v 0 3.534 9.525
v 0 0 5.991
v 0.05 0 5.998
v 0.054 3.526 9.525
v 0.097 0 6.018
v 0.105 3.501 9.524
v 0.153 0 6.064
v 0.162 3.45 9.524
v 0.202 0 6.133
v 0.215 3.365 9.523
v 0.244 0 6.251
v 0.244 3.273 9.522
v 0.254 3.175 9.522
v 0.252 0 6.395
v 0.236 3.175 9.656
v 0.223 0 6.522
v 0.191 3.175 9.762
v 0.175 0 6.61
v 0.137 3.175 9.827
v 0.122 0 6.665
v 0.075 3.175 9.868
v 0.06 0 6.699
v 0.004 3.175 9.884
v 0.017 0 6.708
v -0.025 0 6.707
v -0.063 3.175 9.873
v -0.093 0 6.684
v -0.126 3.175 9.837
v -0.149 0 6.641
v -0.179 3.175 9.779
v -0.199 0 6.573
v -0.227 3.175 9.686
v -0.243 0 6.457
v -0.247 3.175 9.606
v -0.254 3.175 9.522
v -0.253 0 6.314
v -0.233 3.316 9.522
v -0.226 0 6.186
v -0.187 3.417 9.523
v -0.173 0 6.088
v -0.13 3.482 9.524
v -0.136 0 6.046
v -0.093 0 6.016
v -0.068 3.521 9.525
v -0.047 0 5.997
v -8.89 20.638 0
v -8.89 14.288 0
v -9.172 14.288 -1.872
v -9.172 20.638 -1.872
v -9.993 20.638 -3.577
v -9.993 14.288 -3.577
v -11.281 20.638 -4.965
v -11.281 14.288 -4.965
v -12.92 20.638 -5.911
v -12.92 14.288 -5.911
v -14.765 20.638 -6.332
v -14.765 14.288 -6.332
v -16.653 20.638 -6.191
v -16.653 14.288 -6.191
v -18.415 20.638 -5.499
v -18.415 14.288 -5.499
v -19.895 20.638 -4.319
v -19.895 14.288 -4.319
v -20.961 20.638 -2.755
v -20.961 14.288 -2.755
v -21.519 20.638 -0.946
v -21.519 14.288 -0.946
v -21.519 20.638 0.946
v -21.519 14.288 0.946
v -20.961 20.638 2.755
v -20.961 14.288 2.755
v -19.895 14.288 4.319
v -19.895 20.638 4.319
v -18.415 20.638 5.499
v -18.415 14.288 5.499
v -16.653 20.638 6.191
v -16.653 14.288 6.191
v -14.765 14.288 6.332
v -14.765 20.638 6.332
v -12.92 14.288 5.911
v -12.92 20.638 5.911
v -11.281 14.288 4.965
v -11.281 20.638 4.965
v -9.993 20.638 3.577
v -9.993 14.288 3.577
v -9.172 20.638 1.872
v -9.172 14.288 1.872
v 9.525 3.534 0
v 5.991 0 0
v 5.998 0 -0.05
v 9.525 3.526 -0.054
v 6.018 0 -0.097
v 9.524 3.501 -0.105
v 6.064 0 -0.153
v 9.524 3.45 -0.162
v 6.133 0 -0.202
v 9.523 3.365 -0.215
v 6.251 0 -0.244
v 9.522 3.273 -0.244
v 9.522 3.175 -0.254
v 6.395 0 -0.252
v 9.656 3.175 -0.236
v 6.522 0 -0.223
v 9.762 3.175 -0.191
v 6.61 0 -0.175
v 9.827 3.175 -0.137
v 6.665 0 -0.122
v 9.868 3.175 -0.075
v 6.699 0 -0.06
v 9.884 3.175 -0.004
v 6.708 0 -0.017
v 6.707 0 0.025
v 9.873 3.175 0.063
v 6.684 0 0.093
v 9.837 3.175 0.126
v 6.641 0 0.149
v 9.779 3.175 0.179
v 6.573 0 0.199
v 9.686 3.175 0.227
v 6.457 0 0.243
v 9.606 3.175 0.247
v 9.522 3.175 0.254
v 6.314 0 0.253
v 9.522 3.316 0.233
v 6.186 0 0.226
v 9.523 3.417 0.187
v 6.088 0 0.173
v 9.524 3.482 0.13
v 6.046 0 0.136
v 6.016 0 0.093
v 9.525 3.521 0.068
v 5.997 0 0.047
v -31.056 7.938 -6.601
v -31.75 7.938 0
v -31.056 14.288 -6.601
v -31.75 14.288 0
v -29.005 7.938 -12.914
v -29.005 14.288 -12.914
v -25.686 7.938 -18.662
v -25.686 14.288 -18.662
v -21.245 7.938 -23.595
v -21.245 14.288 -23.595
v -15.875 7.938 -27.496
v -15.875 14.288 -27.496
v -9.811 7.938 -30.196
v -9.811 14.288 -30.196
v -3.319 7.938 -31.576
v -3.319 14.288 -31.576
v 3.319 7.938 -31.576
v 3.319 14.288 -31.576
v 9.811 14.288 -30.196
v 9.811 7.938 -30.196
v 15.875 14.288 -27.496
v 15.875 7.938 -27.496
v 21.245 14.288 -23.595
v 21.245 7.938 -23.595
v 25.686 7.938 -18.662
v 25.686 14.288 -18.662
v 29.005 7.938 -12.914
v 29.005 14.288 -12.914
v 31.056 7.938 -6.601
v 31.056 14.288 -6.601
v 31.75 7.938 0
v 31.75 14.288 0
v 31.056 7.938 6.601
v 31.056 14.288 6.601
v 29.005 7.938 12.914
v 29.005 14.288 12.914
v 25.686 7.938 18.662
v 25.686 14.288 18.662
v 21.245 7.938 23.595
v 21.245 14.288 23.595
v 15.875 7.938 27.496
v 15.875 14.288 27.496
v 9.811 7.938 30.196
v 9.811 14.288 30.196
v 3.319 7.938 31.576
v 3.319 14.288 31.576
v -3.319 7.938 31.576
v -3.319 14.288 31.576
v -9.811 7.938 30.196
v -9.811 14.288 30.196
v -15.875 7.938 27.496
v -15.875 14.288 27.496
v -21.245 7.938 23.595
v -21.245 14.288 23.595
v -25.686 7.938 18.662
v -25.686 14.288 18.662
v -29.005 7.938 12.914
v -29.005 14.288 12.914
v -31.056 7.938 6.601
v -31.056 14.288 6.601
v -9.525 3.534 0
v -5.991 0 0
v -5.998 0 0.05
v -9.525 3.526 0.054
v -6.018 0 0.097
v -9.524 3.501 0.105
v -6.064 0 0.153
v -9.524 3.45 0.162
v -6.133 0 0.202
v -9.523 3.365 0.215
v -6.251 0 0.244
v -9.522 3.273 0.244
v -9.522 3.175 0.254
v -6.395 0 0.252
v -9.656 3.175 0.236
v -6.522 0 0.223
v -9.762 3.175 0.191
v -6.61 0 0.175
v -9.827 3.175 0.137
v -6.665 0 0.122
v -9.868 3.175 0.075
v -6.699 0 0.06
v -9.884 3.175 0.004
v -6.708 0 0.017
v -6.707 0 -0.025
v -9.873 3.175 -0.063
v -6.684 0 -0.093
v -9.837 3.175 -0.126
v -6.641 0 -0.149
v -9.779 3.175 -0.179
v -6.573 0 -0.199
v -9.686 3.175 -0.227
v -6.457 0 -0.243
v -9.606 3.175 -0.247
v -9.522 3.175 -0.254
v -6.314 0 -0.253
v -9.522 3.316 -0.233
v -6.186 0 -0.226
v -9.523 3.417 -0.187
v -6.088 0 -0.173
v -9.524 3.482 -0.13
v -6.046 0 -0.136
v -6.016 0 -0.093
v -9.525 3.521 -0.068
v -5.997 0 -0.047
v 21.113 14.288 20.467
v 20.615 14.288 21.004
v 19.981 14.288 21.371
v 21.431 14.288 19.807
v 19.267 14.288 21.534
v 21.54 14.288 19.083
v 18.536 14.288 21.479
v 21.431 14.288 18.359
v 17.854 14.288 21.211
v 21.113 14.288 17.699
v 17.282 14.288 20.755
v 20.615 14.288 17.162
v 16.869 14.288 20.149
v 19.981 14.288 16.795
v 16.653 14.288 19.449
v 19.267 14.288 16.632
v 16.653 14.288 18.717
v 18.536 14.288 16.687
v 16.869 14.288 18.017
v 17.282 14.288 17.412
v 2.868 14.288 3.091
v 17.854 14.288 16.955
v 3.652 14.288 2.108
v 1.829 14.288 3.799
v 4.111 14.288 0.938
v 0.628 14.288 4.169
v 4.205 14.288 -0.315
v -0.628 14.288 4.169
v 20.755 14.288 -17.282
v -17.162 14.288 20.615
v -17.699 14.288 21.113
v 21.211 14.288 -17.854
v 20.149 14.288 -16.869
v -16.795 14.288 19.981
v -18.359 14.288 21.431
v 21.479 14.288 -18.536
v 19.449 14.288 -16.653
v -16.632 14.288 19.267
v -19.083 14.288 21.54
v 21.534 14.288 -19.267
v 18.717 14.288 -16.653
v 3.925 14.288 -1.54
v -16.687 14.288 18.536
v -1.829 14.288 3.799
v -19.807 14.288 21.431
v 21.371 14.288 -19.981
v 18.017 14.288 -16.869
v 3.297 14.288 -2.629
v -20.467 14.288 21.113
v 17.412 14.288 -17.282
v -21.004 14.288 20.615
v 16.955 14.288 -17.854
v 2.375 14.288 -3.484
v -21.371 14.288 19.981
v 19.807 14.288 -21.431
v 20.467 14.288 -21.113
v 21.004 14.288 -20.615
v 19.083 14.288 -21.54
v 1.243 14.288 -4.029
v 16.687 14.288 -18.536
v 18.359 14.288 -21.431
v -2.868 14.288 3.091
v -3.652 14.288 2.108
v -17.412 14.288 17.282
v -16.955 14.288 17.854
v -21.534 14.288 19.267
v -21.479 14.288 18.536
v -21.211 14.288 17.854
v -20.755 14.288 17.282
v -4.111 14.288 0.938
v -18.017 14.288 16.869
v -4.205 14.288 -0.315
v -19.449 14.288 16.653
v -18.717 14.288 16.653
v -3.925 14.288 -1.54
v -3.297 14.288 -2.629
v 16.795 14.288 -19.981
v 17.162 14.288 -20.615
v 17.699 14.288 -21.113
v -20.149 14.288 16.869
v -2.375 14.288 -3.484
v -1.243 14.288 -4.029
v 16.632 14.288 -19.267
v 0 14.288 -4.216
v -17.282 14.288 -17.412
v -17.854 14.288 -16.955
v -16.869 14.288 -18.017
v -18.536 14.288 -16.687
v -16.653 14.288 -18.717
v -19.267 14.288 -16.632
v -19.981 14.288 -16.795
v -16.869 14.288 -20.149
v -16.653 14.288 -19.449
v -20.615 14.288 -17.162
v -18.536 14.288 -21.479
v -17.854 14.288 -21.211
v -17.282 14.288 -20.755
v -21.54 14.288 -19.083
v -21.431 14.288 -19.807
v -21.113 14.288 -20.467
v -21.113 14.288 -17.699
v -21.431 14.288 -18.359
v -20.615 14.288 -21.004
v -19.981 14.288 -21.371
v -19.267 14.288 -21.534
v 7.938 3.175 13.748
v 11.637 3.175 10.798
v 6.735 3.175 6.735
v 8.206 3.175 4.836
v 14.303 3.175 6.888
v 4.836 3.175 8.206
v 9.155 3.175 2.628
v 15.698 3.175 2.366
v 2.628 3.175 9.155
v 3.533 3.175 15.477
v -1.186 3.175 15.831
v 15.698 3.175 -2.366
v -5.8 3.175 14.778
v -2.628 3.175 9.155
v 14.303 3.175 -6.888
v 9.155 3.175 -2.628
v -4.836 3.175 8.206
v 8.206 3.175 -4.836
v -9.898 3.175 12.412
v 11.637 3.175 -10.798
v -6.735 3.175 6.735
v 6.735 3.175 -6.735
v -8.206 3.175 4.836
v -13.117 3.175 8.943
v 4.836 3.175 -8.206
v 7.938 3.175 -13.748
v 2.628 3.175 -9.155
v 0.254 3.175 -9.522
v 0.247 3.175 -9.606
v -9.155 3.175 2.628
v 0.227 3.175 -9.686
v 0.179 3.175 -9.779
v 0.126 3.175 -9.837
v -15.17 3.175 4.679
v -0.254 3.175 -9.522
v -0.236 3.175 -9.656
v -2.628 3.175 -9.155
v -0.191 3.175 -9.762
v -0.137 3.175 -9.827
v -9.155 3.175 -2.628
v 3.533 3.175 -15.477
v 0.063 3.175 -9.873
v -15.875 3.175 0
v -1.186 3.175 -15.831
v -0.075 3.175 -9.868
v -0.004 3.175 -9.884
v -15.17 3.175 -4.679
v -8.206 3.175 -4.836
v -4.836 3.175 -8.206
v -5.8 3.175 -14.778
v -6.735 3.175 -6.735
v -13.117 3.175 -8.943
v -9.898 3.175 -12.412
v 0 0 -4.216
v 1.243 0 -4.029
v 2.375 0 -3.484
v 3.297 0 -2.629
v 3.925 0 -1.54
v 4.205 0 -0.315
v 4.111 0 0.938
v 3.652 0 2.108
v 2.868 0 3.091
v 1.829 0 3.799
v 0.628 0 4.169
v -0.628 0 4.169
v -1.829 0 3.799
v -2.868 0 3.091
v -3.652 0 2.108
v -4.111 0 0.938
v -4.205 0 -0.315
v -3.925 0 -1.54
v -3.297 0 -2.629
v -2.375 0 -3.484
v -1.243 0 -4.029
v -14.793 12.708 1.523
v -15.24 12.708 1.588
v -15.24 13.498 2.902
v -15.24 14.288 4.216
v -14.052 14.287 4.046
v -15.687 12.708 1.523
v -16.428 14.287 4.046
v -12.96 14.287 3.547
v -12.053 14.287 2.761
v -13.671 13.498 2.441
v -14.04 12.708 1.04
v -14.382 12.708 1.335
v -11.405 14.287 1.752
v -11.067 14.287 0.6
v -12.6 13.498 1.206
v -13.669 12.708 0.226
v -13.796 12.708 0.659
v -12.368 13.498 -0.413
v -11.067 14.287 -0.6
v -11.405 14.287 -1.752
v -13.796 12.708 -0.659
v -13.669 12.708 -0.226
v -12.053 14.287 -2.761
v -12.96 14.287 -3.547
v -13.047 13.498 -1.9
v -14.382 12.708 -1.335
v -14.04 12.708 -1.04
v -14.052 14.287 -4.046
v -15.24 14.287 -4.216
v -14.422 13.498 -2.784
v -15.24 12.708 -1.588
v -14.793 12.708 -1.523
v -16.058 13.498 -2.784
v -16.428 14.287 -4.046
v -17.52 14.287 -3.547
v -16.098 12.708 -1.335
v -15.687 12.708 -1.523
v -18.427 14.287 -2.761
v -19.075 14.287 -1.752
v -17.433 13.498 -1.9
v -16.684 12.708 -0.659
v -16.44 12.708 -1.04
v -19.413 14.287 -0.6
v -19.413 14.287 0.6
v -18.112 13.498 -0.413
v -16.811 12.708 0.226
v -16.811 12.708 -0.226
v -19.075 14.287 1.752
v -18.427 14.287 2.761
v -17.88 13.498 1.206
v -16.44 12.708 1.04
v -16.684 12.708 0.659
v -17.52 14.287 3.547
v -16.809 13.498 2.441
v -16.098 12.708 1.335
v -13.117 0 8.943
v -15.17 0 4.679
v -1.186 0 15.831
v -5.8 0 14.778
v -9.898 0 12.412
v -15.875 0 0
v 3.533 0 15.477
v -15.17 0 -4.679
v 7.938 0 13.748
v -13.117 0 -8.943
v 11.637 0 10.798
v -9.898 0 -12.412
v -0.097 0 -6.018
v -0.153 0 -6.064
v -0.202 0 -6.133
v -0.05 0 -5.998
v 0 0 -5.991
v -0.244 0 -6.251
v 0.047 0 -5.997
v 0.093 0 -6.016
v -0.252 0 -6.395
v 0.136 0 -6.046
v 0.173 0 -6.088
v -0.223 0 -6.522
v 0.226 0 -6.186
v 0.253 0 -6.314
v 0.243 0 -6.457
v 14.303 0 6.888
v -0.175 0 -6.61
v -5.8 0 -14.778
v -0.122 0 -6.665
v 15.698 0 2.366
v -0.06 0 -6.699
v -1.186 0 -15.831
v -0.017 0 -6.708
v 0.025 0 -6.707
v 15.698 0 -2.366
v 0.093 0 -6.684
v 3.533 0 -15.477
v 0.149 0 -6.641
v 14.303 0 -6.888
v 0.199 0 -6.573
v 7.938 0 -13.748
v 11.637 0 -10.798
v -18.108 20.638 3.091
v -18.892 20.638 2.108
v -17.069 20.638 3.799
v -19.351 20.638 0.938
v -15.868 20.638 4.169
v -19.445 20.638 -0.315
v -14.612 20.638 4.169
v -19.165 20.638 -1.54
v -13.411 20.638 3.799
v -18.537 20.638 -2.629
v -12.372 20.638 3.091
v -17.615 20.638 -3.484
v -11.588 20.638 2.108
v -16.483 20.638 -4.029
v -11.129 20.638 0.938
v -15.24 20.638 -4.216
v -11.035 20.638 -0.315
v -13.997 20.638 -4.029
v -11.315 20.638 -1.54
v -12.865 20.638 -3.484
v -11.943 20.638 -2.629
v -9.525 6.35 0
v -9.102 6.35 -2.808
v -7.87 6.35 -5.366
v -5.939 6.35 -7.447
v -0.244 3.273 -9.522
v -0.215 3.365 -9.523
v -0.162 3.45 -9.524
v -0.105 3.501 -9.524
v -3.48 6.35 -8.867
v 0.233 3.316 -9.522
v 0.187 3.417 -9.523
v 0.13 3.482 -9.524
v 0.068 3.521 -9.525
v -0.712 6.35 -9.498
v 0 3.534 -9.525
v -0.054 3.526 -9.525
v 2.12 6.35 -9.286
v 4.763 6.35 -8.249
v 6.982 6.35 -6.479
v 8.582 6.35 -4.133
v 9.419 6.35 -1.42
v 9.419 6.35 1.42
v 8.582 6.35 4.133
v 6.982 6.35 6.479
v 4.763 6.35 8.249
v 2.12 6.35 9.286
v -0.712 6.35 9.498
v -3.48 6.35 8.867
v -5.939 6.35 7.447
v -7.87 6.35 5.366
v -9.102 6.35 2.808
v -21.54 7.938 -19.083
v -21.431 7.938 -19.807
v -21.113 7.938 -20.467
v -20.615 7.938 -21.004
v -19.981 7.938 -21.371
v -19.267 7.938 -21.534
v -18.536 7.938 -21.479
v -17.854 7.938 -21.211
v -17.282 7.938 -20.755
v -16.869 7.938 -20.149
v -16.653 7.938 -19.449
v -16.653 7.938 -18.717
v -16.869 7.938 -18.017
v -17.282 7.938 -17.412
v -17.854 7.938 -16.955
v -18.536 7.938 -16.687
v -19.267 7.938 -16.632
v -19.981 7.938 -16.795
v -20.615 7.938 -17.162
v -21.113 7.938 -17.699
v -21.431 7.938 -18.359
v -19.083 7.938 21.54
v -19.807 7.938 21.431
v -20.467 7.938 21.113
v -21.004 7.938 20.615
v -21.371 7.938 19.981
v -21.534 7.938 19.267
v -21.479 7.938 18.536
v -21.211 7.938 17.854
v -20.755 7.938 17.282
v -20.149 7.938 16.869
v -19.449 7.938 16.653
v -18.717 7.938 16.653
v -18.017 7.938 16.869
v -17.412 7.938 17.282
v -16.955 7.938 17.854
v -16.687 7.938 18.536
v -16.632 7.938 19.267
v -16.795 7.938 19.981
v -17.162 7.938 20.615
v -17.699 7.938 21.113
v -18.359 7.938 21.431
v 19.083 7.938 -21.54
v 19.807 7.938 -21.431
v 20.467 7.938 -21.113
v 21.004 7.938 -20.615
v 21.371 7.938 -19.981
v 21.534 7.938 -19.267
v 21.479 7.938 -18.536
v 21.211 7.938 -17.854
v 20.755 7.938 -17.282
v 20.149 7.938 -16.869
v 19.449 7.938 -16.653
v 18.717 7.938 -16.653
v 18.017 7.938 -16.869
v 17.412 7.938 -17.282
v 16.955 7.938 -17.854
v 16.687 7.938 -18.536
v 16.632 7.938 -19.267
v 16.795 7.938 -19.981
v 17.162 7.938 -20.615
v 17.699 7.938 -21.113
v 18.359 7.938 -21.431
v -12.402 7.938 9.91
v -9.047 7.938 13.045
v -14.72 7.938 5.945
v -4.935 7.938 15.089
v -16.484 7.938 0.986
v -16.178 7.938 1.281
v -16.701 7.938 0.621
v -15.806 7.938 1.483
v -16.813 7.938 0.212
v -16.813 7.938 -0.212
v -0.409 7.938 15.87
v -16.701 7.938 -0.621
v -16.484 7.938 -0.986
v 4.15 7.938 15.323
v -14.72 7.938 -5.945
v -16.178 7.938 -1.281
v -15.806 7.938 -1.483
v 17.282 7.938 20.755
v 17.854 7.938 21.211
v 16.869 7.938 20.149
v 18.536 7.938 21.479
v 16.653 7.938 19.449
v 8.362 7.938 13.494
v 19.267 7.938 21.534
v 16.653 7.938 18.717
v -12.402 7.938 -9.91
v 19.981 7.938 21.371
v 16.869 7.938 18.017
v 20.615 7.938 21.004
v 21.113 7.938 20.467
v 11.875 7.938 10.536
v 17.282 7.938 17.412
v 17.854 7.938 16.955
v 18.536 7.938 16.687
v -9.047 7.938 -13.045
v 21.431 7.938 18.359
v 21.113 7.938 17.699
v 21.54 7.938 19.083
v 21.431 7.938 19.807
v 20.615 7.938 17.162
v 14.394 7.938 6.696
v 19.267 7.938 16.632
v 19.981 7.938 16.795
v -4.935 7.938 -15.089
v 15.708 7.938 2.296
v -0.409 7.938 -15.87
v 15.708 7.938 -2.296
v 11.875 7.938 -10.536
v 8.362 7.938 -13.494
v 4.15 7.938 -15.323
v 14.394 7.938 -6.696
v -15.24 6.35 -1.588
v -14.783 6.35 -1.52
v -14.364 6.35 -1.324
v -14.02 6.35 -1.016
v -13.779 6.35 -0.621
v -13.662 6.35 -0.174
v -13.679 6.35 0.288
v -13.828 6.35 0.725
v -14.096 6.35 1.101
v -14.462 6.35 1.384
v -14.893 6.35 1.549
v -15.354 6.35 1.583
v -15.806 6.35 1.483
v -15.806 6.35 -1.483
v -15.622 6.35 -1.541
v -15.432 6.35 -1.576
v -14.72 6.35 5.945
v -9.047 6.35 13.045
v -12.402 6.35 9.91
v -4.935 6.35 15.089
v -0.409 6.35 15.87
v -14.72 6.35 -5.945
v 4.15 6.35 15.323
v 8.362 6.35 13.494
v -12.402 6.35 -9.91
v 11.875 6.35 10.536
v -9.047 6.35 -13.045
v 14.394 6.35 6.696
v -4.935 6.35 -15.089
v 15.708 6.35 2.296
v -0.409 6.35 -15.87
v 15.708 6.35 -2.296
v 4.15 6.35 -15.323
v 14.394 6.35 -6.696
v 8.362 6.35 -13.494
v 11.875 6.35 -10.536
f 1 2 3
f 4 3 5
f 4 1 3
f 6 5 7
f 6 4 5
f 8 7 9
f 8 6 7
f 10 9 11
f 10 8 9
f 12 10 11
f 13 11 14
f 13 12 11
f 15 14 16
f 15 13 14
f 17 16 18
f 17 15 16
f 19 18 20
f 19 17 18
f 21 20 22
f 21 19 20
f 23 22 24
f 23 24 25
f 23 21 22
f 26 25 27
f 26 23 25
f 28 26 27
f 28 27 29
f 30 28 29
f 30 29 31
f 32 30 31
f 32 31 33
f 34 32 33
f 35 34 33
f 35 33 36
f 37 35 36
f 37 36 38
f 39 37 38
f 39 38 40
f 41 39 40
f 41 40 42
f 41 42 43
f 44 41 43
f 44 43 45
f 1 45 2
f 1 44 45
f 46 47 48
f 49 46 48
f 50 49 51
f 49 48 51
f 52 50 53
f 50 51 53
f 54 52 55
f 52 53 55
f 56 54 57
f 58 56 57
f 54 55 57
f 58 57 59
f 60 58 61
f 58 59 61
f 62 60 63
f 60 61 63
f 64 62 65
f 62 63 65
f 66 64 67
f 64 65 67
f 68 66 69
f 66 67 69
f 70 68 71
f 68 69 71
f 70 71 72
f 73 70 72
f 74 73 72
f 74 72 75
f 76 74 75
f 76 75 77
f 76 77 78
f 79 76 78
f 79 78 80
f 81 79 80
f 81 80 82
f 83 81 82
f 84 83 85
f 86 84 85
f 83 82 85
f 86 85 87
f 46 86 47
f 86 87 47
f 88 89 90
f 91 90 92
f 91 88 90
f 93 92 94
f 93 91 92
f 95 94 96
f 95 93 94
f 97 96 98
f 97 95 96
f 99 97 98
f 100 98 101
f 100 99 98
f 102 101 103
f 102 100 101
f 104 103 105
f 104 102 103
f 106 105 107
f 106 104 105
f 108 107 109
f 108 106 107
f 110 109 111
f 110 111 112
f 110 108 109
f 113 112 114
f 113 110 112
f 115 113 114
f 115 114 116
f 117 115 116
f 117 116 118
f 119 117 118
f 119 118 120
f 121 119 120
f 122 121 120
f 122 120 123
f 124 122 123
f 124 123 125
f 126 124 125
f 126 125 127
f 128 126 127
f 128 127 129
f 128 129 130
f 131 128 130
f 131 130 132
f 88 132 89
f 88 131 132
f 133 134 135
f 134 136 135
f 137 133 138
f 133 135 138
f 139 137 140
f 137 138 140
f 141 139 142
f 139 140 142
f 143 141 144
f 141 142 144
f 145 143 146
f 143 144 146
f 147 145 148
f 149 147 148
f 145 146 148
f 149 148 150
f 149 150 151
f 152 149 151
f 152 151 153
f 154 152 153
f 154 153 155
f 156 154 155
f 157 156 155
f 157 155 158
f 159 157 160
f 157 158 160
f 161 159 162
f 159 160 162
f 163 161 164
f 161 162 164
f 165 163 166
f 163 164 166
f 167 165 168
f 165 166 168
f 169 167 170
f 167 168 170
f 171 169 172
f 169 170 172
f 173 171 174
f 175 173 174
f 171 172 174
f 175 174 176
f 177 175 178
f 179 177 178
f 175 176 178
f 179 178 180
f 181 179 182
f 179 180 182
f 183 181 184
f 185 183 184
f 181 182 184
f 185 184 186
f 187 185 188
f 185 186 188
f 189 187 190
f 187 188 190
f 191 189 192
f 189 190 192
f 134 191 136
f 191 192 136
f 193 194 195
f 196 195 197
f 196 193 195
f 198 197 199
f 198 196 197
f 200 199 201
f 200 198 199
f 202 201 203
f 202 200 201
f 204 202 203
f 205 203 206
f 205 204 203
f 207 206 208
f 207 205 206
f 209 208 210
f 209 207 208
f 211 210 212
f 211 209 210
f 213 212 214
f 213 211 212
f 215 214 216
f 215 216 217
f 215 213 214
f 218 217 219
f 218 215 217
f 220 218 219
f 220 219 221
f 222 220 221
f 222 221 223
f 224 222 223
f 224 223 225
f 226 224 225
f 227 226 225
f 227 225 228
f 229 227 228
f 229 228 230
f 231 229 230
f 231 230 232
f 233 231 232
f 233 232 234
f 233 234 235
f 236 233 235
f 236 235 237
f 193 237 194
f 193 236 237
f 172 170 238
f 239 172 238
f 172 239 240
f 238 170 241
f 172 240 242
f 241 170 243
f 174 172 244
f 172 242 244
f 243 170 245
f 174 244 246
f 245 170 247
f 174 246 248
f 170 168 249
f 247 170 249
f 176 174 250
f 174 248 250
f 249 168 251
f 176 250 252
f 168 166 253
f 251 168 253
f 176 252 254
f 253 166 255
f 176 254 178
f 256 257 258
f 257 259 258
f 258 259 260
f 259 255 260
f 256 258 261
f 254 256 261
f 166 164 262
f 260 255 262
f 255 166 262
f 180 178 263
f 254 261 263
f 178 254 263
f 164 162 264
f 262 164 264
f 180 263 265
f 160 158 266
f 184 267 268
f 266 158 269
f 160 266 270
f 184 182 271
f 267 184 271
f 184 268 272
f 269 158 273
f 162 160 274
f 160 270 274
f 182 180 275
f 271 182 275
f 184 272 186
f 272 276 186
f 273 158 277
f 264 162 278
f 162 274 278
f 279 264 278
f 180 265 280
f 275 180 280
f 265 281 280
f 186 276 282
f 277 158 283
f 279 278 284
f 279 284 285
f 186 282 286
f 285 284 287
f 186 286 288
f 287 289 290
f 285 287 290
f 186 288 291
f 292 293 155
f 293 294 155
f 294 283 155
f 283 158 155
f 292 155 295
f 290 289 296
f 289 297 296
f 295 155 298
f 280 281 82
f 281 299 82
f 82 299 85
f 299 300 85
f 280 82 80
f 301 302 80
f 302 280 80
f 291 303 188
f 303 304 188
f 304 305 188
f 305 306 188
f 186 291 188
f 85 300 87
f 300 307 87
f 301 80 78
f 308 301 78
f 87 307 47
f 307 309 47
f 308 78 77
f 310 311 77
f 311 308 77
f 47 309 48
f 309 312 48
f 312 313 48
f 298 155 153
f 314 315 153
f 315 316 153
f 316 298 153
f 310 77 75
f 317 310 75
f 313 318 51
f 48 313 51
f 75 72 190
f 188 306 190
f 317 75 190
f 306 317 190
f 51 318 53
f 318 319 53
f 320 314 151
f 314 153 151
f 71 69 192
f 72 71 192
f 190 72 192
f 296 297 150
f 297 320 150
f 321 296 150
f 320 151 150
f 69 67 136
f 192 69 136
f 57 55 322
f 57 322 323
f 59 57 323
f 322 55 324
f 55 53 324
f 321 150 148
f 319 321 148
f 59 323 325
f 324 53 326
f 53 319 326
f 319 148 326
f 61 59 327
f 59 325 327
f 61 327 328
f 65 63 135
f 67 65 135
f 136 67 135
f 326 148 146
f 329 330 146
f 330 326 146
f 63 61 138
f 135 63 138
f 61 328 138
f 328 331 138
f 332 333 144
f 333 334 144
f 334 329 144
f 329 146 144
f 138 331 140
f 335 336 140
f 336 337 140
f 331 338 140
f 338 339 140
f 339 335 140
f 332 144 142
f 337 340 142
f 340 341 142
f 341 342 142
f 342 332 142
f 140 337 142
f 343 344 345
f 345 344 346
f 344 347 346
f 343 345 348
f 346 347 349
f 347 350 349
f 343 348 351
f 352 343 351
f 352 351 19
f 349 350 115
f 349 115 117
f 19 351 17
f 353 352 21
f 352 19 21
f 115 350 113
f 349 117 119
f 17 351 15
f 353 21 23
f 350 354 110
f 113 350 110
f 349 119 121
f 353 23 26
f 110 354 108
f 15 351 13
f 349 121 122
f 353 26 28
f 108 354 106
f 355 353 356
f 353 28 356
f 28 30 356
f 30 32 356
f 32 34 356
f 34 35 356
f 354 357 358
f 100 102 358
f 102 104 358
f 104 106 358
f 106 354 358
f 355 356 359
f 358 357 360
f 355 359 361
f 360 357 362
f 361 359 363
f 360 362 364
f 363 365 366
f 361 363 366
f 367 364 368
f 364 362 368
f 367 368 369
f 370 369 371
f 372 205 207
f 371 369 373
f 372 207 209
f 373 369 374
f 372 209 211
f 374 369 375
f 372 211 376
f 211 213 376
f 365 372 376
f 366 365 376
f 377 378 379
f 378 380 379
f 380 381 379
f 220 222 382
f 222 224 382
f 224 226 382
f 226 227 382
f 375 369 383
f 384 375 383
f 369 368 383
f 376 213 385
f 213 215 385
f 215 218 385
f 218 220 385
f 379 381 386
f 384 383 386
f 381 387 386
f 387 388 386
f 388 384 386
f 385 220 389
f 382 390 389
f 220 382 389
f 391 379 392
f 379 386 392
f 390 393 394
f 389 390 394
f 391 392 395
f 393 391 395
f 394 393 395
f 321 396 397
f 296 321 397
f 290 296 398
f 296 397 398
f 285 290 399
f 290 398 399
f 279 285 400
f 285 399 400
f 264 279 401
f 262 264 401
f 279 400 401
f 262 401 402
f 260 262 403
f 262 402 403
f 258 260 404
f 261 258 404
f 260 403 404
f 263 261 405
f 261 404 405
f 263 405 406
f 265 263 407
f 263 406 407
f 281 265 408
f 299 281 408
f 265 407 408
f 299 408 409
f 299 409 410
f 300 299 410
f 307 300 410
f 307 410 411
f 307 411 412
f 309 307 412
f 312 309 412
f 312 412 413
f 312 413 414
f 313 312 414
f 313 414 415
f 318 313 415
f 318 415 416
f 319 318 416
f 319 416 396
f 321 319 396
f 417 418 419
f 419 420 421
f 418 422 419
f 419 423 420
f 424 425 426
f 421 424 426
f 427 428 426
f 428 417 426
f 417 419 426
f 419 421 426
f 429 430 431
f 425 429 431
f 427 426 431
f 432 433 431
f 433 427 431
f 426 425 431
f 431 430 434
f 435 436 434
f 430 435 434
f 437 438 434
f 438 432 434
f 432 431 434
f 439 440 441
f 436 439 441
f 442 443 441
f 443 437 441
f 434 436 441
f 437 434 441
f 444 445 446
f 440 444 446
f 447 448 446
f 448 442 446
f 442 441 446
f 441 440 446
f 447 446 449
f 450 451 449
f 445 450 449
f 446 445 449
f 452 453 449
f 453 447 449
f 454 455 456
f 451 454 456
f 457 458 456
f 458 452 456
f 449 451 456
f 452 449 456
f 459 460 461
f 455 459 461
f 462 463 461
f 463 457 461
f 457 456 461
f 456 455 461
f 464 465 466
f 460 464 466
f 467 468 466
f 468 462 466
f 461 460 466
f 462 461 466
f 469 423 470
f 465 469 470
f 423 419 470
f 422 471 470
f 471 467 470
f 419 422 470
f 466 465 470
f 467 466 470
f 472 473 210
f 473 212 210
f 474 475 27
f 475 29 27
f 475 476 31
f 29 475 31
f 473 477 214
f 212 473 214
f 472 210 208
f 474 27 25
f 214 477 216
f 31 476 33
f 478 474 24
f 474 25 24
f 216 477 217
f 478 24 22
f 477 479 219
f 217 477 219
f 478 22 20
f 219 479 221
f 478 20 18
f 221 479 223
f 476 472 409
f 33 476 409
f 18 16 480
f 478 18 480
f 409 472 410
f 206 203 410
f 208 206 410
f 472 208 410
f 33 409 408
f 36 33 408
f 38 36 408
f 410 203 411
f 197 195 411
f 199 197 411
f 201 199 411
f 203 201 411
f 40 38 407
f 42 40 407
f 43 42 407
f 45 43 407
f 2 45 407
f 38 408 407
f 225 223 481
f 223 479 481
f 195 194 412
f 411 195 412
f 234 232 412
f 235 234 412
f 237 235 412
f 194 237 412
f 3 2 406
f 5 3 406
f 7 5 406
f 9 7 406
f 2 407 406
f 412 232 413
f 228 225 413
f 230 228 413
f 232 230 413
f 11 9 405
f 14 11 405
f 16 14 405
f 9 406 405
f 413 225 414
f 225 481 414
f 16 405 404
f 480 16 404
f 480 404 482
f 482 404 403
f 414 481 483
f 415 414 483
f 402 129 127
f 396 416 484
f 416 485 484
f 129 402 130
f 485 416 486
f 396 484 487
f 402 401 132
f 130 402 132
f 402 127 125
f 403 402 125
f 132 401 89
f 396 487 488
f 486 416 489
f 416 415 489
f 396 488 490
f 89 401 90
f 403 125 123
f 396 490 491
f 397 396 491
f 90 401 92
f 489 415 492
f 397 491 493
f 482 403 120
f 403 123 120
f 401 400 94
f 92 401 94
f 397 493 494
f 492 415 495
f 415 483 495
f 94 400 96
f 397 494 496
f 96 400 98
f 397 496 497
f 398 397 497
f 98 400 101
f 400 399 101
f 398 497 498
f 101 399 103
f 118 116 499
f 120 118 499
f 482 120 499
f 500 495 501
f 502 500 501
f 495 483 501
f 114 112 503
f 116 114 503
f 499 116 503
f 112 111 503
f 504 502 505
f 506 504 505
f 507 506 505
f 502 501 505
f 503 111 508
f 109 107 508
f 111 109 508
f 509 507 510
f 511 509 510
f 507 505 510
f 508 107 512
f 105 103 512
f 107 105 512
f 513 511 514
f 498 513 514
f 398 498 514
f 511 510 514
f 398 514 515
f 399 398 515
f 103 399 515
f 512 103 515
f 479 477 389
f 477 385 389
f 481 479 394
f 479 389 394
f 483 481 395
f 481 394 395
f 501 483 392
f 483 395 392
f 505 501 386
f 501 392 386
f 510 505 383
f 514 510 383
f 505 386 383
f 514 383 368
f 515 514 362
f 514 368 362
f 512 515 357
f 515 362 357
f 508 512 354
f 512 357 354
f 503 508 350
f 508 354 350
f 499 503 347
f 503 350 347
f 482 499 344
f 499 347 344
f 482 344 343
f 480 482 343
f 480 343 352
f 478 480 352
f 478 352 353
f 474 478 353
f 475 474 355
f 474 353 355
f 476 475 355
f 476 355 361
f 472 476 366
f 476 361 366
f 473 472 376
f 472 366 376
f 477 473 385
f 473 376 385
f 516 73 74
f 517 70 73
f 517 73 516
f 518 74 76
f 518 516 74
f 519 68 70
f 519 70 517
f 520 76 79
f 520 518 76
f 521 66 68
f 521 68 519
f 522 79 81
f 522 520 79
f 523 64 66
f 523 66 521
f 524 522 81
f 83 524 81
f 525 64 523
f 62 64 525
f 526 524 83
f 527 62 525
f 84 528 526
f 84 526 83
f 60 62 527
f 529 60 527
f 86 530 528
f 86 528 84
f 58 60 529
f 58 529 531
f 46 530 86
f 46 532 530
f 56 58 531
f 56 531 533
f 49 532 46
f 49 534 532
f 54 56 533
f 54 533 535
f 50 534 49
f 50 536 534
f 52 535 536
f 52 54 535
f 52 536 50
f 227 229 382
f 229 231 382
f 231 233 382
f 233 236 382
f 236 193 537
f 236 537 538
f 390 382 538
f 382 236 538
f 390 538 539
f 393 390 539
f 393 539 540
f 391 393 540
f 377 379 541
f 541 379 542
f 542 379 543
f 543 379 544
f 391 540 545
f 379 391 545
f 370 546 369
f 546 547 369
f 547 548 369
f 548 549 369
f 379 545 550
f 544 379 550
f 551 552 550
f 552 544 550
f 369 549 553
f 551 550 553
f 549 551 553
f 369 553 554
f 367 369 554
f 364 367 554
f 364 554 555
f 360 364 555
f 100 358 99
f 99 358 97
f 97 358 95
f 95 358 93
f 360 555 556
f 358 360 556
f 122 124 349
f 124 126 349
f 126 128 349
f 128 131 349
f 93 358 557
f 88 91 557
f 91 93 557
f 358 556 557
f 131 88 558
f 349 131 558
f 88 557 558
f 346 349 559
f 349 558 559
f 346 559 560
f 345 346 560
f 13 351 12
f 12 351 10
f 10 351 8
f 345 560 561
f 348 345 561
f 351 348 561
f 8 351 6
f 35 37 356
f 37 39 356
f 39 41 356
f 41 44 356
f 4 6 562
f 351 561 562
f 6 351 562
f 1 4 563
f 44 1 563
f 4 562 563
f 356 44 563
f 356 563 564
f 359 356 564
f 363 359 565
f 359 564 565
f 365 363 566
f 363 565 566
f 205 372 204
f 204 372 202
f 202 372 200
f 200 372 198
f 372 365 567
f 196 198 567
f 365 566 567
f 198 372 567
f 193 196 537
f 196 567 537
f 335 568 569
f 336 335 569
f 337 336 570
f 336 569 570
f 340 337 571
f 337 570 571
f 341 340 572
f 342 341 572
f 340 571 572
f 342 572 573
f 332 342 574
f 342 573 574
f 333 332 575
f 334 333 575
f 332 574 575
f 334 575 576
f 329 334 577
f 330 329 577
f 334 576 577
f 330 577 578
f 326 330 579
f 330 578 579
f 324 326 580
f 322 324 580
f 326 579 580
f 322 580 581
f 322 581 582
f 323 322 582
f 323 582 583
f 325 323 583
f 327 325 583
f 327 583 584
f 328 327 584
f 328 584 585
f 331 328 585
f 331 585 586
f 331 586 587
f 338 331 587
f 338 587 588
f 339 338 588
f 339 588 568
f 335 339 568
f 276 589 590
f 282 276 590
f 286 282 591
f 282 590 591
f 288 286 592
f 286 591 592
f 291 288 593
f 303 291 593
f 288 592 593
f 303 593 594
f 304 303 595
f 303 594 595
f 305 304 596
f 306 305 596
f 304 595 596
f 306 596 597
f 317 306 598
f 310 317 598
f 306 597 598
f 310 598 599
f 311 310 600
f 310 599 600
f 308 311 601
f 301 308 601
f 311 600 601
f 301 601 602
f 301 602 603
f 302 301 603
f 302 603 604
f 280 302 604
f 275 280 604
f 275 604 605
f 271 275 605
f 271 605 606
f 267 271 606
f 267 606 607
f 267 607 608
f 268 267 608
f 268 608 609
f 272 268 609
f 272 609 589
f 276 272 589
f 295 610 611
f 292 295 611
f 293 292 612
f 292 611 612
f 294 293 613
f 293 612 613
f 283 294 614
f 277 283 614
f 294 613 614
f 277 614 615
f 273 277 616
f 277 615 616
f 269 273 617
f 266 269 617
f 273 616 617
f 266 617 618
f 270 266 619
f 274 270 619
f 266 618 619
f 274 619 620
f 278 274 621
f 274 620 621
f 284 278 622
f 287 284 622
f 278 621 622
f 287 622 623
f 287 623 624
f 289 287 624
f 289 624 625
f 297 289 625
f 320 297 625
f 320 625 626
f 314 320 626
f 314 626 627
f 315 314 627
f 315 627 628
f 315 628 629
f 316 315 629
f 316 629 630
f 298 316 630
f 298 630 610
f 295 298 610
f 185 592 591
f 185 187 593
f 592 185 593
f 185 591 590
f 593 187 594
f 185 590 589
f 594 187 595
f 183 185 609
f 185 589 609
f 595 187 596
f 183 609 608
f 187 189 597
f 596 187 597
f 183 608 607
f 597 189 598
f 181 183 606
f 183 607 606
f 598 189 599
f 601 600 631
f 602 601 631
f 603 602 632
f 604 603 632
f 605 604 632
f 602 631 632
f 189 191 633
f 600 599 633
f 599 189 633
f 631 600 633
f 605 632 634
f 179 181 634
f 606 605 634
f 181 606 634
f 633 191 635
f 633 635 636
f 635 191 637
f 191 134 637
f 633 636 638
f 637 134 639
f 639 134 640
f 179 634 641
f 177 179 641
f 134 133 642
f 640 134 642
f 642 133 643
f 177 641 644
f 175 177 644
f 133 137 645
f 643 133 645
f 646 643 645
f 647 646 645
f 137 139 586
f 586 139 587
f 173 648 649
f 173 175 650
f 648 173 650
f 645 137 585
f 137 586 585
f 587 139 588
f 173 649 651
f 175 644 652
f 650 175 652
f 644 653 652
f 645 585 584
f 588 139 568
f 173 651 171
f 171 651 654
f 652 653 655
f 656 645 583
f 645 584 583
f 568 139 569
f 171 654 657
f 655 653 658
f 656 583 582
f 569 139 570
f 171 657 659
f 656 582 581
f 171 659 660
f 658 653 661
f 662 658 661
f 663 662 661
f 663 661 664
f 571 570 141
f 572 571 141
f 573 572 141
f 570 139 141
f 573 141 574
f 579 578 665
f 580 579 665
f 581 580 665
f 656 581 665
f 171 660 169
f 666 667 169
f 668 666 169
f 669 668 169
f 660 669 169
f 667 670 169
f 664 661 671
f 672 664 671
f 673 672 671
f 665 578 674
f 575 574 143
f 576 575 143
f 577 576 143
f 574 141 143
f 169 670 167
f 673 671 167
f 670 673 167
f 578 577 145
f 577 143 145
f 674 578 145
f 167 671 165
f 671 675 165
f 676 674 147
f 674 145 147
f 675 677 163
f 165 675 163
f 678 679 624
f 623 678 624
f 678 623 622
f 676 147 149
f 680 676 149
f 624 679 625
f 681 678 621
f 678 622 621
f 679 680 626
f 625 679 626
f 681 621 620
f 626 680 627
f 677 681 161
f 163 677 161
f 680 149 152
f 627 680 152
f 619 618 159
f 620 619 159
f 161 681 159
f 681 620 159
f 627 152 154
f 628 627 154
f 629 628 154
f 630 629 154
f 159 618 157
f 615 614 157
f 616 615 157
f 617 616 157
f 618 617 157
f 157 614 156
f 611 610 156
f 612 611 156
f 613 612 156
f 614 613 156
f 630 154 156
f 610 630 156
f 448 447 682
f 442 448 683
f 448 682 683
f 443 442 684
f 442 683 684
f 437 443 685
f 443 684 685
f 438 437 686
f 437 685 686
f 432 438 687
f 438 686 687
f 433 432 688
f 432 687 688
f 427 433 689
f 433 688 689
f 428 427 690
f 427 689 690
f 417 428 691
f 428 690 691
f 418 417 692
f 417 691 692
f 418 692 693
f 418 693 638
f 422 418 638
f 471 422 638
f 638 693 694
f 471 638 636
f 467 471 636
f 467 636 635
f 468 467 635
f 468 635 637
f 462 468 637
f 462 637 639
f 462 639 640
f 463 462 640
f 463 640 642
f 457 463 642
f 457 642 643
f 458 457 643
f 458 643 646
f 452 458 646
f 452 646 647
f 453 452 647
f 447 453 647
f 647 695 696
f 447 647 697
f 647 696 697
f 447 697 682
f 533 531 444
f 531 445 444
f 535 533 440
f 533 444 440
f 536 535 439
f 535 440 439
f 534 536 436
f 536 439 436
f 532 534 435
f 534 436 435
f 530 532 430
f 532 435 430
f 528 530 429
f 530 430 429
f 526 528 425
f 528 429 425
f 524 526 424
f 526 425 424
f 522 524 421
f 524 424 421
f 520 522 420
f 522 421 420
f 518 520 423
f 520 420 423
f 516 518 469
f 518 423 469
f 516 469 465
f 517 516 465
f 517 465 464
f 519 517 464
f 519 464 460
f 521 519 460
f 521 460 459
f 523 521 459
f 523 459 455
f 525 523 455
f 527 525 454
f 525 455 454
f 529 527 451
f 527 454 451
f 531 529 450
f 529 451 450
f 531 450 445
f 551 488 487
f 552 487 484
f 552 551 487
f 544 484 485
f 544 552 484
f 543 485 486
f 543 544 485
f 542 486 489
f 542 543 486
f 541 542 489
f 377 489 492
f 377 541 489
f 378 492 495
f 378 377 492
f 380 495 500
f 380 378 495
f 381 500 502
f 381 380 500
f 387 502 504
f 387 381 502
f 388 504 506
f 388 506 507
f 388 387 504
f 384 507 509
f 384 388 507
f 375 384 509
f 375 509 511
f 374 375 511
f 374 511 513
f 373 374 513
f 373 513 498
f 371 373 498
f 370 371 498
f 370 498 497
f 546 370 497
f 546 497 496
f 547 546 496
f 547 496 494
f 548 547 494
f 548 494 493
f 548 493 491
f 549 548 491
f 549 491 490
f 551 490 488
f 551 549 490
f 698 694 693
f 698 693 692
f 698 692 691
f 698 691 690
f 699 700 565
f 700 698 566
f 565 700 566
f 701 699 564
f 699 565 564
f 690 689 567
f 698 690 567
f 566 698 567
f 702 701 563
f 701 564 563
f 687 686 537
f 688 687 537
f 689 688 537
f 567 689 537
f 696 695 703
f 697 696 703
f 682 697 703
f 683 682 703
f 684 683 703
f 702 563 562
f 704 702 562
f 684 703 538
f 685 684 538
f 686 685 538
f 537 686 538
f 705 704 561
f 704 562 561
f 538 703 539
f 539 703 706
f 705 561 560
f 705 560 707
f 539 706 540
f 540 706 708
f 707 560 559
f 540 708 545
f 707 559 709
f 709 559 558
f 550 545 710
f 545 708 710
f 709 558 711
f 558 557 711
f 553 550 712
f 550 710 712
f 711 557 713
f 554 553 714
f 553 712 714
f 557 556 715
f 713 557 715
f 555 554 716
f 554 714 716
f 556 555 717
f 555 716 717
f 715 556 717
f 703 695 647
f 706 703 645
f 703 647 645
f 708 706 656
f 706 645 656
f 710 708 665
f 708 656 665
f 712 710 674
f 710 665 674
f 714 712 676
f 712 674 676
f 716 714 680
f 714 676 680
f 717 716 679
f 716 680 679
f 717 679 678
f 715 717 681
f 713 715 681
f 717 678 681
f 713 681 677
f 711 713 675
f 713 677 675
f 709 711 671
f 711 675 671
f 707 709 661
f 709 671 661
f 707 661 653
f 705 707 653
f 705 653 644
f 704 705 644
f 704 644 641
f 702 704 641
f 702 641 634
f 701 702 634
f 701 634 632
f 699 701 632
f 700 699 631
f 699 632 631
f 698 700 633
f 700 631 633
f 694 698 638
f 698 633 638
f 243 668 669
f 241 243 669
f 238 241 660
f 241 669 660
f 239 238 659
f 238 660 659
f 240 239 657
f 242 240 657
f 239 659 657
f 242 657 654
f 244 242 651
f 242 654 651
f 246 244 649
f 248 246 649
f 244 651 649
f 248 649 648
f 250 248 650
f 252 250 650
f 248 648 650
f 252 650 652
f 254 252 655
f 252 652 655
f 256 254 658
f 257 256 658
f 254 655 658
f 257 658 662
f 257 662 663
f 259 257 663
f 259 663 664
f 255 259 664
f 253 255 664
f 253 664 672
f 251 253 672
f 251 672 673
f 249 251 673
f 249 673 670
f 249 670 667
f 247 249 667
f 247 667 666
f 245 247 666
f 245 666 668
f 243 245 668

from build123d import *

# Parameters (mm, degrees)
PIPE_TAP_DRILL_FOR_1_8_TAP1_D     = 8.4328
PIPE_TAP_DRILL_FOR_1_8_TAP1_DEPTH = 25.4
PIPE_TAP_DRILL_FOR_1_8_TAP1_TIP   = 2.533468714
CIRPATTERN1_COUNT                 = 4
SKETCH5_R                         = 6.35
BOSS_EXTRUDE1_DEPTH               = 6.35
PIPE_TAP_DRILL_FOR_1_8_TAP2_D     = 8.4328
PIPE_TAP_DRILL_FOR_1_8_TAP2_DEPTH = 6.35
PIPE_TAP_DRILL_FOR_1_8_TAP2_TIP   = 2.533468714
F_1_8_0_125_DIAMETER_HOLE4_D      = 3.175
F_1_8_0_125_DIAMETER_HOLE4_DEPTH  = 14.2875
F_10_0_1935_DIAMETER_HOLE1_D      = 4.9149
F_10_0_1935_DIAMETER_HOLE1_DEPTH  = 6.35
CIRPATTERN2_COUNT                 = 4


with BuildPart() as part:
    # Sketch1 → Revolve1 (revolve)
    with BuildSketch(Plane.XY):
        Polygon((0, 0), (-15.875, 0), (-15.875, 3.175), (-9.525, 3.175), (-9.525, 6.35), (-15.875, 6.35), (-15.875, 7.9375), (-31.75, 7.9375), (-31.75, 14.2875), (0, 14.2875), align=None)
    revolve(axis=Axis((0, 14.2875, 0), (0, -1, 0)))

    # Pipe Tap Drill for 1/8 Tap1
    with Locations(Plane.ZX.offset(14.2875)):
        with Locations((0, 0)):
            Hole(PIPE_TAP_DRILL_FOR_1_8_TAP1_D / 2, depth=PIPE_TAP_DRILL_FOR_1_8_TAP1_DEPTH)
            with Locations((0, 0, -(PIPE_TAP_DRILL_FOR_1_8_TAP1_DEPTH + PIPE_TAP_DRILL_FOR_1_8_TAP1_TIP / 2))):  # 118° drill point
                Cone(0, PIPE_TAP_DRILL_FOR_1_8_TAP1_D / 2, PIPE_TAP_DRILL_FOR_1_8_TAP1_TIP, mode=Mode.SUBTRACT)

    # Sketch3 → Cut-Revolve2 (revolve, cut)
    with BuildSketch(Plane(origin=(0, 0, 0), x_dir=(-1, 0, 0), z_dir=(0, 0, -1))):
        Polygon((-11.388289755, 5.3975), (-11.567894878, 5.217894878), (-4.900394878, -1.449605122), (-4.720789755, -1.27), align=None)
    cut_revolve2 = revolve(axis=Axis((11.567894878, 5.217894878, 0), (-0.707106781, -0.707106781, 0)), mode=Mode.SUBTRACT)

    # CirPattern1: Cut-Revolve2 ×4 about axis
    cirpattern1_axis = Axis((0, 14.2875, 0), (0, 1, 0))
    for i in range(1, CIRPATTERN1_COUNT):
        add(cut_revolve2.rotate(cirpattern1_axis, i * 360 / CIRPATTERN1_COUNT), mode=Mode.SUBTRACT)

    # Sketch5 → Boss-Extrude1 (add)
    with BuildSketch(Plane(origin=(0, 14.2875, 0), x_dir=(1, 0, 0), z_dir=(0, 1, 0))):
        with Locations((-15.24, 0)):
            Circle(SKETCH5_R)
    extrude(amount=BOSS_EXTRUDE1_DEPTH)

    # Pipe Tap Drill for 1/8 Tap2
    with Locations(Plane(origin=(-15.24, 20.6375, 0), x_dir=(0, 0, 1), z_dir=(0, 1, 0))):
        with Locations((0, 0)):
            Hole(PIPE_TAP_DRILL_FOR_1_8_TAP2_D / 2, depth=PIPE_TAP_DRILL_FOR_1_8_TAP2_DEPTH)
            with Locations((0, 0, -(PIPE_TAP_DRILL_FOR_1_8_TAP2_DEPTH + PIPE_TAP_DRILL_FOR_1_8_TAP2_TIP / 2))):  # 118° drill point
                Cone(0, PIPE_TAP_DRILL_FOR_1_8_TAP2_D / 2, PIPE_TAP_DRILL_FOR_1_8_TAP2_TIP, mode=Mode.SUBTRACT)

    # 1/8 (0.125) Diameter Hole4
    with Locations(Plane(origin=(-15.24, 20.6375, 0), x_dir=(0, 0, 1), z_dir=(0, 1, 0))):
        with Locations((0, 0)):
            Hole(F_1_8_0_125_DIAMETER_HOLE4_D / 2, depth=F_1_8_0_125_DIAMETER_HOLE4_DEPTH)

    # #10 (0.1935) Diameter Hole1
    with Locations(Plane(origin=(19.083044257, 14.2875, -19.083044257), x_dir=(0, 0, 1), z_dir=(0, 1, 0))):
        with Locations((0, 0)):
            f_10_0_1935_diameter_hole1 = Hole(F_10_0_1935_DIAMETER_HOLE1_D / 2, depth=F_10_0_1935_DIAMETER_HOLE1_DEPTH)

    # CirPattern2: #10 (0.1935) Diameter Hole1 ×4 about axis
    cirpattern2_axis = Axis((0, 0, 0), (0, 1, 0))
    for i in range(1, CIRPATTERN2_COUNT):
        add(f_10_0_1935_diameter_hole1.rotate(cirpattern2_axis, i * 360 / CIRPATTERN2_COUNT), mode=Mode.SUBTRACT)


solid = part.part
